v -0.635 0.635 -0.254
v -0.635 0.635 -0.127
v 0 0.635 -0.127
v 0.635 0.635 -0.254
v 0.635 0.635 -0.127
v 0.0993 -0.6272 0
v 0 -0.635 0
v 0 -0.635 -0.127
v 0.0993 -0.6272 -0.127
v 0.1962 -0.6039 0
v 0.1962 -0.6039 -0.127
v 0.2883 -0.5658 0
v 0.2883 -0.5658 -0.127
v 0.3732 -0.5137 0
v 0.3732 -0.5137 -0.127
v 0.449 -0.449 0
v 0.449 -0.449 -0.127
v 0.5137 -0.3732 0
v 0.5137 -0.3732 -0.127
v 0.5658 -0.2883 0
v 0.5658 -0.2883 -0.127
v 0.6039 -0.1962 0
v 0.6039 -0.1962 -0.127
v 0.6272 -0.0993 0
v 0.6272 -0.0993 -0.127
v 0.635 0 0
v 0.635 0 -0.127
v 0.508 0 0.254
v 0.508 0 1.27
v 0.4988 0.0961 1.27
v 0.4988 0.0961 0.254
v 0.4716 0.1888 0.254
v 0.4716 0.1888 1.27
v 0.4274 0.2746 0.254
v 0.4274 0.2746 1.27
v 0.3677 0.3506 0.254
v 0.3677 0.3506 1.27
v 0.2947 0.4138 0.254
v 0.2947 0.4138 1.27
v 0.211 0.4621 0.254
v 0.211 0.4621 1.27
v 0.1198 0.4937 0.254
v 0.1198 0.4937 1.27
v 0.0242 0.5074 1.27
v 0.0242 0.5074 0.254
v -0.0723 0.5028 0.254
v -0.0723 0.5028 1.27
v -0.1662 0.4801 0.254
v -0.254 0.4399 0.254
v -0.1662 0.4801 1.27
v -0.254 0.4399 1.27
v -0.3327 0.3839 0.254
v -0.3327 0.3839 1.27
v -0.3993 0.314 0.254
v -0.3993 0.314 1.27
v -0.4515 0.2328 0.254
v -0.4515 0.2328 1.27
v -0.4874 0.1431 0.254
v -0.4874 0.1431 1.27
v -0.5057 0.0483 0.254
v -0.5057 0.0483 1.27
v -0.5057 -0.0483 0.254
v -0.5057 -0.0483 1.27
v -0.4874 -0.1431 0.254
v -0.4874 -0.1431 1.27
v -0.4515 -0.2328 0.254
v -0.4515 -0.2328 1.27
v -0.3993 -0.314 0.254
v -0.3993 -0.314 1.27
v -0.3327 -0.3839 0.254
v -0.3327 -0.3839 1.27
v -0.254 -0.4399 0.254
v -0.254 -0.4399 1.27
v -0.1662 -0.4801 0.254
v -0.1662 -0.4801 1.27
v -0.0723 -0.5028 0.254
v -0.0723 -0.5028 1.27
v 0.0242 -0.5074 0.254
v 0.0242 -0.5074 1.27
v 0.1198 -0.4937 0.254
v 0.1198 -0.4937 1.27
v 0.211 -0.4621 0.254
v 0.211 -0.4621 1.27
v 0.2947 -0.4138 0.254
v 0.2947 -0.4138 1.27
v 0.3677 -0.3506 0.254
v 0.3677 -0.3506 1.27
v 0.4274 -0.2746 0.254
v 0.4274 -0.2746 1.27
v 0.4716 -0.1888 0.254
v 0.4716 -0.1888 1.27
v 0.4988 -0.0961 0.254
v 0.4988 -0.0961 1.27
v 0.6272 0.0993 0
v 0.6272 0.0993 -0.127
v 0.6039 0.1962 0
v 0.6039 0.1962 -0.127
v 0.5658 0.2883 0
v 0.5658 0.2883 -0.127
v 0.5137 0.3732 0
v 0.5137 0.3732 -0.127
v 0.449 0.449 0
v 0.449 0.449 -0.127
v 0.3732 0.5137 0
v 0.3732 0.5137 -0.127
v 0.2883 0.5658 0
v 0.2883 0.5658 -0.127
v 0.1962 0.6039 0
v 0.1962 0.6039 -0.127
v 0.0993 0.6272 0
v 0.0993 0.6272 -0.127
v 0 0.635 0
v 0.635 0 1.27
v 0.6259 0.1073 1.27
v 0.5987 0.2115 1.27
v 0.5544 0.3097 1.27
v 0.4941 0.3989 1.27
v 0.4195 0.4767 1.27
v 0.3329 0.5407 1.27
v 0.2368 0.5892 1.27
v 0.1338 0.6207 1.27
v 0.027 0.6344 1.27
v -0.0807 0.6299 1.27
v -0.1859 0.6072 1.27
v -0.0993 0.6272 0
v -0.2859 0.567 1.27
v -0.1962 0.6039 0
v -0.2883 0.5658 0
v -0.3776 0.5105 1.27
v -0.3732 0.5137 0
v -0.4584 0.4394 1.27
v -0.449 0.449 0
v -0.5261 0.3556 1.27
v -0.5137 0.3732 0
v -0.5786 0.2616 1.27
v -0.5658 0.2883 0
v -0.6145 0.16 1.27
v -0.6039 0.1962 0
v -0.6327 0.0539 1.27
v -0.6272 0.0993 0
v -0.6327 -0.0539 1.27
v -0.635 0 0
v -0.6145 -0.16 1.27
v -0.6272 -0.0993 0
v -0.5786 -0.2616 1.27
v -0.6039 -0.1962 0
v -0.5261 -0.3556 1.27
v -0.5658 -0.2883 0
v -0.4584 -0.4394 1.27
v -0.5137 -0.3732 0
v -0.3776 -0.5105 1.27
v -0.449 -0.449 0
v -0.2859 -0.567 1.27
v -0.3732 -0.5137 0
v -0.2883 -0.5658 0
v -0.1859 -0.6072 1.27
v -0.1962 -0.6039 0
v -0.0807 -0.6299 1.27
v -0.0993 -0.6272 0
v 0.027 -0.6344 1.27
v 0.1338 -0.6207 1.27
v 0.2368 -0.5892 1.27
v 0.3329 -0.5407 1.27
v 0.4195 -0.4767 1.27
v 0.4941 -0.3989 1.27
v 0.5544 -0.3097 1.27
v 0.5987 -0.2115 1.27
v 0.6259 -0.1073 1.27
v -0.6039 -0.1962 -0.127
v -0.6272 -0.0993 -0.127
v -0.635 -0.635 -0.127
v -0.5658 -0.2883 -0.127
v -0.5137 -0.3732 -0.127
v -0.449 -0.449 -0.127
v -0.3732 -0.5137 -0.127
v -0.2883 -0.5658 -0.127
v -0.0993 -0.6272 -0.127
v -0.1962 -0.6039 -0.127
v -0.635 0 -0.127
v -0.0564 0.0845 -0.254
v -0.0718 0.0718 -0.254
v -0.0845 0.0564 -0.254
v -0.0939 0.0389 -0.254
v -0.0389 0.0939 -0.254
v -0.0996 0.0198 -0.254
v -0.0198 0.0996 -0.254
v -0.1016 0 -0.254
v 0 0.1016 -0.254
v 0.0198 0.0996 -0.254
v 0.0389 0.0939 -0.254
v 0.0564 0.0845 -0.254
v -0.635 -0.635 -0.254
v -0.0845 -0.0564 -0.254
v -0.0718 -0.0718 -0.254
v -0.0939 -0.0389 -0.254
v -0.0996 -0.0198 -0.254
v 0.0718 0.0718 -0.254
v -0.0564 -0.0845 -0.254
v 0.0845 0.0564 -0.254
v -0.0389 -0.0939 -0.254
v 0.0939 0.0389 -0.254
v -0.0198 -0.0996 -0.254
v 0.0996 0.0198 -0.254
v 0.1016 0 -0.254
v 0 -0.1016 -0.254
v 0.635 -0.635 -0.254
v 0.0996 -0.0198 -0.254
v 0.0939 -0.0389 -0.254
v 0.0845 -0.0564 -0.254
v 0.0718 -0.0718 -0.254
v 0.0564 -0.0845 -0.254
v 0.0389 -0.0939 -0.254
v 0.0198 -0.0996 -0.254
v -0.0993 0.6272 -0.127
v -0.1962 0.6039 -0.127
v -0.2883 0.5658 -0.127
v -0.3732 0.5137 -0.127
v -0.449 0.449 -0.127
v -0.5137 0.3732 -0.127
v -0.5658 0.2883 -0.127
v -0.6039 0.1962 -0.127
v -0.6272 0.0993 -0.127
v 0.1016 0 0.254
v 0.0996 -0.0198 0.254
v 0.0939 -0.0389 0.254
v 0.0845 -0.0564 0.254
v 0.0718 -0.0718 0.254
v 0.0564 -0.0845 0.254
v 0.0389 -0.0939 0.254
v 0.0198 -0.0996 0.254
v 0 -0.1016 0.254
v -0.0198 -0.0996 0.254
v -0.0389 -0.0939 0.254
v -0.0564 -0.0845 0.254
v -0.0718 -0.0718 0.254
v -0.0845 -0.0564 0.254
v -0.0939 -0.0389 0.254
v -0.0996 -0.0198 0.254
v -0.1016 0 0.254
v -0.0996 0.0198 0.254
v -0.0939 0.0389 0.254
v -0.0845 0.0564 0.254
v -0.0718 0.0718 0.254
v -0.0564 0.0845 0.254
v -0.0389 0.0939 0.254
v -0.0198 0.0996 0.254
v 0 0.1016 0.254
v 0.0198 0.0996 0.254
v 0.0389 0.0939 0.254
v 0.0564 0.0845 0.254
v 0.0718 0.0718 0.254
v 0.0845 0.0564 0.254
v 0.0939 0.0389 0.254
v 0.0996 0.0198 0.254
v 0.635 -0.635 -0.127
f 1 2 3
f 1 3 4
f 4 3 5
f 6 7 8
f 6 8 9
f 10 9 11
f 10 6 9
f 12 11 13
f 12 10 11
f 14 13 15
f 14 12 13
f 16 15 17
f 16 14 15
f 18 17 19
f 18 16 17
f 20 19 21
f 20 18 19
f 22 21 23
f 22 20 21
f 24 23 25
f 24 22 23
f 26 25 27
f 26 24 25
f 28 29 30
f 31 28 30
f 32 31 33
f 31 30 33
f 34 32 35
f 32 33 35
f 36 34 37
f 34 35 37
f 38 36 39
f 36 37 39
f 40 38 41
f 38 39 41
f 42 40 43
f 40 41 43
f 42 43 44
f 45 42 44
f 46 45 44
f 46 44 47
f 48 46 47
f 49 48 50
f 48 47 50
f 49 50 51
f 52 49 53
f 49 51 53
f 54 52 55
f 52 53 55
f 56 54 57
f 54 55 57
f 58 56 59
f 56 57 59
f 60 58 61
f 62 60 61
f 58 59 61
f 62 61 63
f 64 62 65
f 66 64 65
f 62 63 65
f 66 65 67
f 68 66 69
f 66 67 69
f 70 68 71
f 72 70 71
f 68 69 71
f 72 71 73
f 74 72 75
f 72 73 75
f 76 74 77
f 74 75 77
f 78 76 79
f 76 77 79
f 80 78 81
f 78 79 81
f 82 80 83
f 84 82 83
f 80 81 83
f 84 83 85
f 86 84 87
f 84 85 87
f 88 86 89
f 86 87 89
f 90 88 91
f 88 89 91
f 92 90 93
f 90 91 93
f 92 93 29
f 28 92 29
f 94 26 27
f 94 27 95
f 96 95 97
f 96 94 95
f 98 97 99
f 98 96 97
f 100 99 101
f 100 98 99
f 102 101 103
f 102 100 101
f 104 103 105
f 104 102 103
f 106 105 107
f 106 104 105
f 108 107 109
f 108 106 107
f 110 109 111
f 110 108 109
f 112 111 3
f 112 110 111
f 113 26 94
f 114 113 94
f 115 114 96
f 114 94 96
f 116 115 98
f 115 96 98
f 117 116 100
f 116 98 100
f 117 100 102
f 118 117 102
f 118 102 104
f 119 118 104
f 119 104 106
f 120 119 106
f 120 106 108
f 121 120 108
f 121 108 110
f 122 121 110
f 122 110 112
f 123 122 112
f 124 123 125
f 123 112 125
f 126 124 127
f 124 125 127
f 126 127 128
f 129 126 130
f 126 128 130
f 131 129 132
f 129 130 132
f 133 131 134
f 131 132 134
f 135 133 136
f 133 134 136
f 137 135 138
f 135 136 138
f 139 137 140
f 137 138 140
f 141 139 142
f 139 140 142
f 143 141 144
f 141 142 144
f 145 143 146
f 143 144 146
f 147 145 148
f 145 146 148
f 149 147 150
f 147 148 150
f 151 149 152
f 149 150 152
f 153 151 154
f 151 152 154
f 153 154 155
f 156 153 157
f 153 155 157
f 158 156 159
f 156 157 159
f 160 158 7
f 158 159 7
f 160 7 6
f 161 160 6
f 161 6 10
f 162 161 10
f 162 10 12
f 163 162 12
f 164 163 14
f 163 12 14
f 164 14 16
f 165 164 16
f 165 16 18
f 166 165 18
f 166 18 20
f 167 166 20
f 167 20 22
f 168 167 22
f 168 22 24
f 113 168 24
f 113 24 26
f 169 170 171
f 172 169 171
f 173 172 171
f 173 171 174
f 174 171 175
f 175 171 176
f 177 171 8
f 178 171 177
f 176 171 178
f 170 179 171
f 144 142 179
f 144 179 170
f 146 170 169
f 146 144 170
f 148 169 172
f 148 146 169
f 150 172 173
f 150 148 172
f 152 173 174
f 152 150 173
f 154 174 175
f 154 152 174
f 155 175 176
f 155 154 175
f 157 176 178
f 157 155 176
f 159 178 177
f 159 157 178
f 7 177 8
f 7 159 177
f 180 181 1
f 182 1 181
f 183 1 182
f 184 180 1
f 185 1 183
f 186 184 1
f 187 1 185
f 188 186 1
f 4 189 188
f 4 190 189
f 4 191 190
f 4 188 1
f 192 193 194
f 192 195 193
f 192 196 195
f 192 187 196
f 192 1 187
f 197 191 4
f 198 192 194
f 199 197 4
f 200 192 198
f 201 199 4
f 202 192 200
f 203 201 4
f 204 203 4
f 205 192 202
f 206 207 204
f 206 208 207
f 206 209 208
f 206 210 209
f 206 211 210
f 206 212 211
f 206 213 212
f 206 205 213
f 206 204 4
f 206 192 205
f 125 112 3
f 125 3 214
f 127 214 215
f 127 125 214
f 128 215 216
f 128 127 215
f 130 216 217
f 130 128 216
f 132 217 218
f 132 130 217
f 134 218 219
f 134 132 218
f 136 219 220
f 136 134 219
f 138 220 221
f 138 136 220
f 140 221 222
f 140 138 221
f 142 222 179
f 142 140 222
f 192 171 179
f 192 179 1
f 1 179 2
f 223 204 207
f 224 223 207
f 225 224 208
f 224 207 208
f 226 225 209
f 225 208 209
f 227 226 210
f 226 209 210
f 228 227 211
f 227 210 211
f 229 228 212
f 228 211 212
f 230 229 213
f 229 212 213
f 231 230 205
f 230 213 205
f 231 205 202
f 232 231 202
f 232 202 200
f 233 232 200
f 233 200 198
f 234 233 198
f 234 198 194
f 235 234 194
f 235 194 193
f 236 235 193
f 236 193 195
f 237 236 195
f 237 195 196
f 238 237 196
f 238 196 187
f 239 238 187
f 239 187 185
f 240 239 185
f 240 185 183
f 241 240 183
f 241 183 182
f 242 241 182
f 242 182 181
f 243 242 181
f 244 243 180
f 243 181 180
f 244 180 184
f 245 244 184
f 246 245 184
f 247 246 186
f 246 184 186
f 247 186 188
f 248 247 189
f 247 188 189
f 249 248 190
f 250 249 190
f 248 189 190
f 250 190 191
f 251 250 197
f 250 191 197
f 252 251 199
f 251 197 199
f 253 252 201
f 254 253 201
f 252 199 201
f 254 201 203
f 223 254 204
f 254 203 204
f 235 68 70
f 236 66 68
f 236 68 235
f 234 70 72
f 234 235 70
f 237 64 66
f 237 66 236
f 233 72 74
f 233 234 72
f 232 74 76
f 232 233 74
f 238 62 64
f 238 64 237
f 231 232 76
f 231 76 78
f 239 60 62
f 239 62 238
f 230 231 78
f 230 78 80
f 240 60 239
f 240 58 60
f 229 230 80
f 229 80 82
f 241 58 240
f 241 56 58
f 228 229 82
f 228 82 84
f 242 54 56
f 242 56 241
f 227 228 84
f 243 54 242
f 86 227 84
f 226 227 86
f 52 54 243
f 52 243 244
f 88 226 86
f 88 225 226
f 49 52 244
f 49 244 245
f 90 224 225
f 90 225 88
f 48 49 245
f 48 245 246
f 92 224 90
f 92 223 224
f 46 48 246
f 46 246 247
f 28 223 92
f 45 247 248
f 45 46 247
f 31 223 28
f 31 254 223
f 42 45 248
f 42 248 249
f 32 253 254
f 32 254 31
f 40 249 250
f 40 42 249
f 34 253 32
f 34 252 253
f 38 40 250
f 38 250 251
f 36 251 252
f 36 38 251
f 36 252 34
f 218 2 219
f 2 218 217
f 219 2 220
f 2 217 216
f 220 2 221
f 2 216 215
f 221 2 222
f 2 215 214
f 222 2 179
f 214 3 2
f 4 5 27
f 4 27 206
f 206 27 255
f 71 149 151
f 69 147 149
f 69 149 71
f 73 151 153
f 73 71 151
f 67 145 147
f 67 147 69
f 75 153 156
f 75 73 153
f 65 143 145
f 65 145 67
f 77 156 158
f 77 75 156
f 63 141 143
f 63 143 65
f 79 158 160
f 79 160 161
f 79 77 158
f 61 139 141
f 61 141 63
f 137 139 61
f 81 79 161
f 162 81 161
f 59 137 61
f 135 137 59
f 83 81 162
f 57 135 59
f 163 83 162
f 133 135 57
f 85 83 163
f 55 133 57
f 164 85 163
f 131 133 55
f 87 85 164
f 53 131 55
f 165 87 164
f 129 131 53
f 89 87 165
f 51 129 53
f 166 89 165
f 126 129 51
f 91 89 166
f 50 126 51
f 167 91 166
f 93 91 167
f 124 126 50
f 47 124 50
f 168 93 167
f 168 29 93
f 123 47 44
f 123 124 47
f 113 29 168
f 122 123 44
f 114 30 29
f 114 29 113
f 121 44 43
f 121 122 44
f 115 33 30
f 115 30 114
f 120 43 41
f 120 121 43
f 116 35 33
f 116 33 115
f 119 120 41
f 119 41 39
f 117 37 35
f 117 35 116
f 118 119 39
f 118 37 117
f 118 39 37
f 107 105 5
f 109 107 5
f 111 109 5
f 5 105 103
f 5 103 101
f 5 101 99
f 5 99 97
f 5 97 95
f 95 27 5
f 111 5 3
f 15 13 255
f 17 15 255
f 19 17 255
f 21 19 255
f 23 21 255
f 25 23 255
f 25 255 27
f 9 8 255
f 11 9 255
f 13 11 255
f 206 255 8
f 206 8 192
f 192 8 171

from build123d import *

# Parameters (mm, degrees)
F0_R     = 0.635
F1_DEPTH = 1.27
F2_R     = 0.508
F3_DEPTH = 1.016
F5_DEPTH = 0.254
F6_DEPTH = 0.127
F7_R     = 0.1016
F8_DEPTH = 25.4


with BuildPart() as f1:
    # F0 (on Top) → F1 (new body)
    with BuildSketch(Plane.XY):
        Circle(F0_R)
    extrude(amount=F1_DEPTH)

    # F2 (on face) → F3 (cut)
    with BuildSketch(Plane.XY.offset(1.27)):
        Circle(F2_R)
    extrude(amount=-F3_DEPTH, mode=Mode.SUBTRACT)

    # F4 (on face) → F5 (join)
    with BuildSketch(Plane(origin=(0, 0, 0), x_dir=(1, 0, 0), z_dir=(0, 0, -1))):
        with BuildLine():
            Line((0.635, 0), (0.635, 0.635))
            Line((0.635, 0.635), (0, 0.635))
            ThreePointArc((0, 0.635), (0.4490128061, 0.4490128061), (0.635, 0))
        make_face()
        with BuildLine():
            ThreePointArc((-0.635, 0), (-0.4490128061, 0.4490128061), (0, 0.635))
            Line((0, 0.635), (-0.635, 0.635))
            Line((-0.635, 0.635), (-0.635, 0))
        make_face()
        with BuildLine():
            ThreePointArc((0.635, 0), (0.4490128061, 0.4490128061), (0, 0.635))
            ThreePointArc((0, 0.635), (-0.4490128061, 0.4490128061), (-0.635, 0))
            ThreePointArc((-0.635, 0), (-0.4490128061, -0.4490128061), (0, -0.635))
            ThreePointArc((0, -0.635), (0.4490128061, -0.4490128061), (0.635, 0))
        make_face()
        with BuildLine():
            Line((0.635, -0.635), (0.635, 0))
            ThreePointArc((0.635, 0), (0.4490128061, -0.4490128061), (0, -0.635))
            Line((0, -0.635), (0.635, -0.635))
        make_face()
        with BuildLine():
            ThreePointArc((0, -0.635), (-0.4490128061, -0.4490128061), (-0.635, 0))
            Line((-0.635, 0), (-0.635, -0.635))
            Line((-0.635, -0.635), (0, -0.635))
        make_face()
    extrude(amount=F5_DEPTH)

    # F6 (cut): faces of the model
    f6_faces = [f1.faces().sort_by_distance(p)[0] for p in [
        (-0.4931613588, 0.4931613588, 0),
        (-0.4931613588, -0.4931613588, 0),
        (0.4931613588, -0.4931613588, 0),
        (0.4931613588, 0.4931613588, 0),
    ]]
    extrude(f6_faces, amount=-F6_DEPTH, mode=Mode.SUBTRACT)

    # F7 (on face) → F8 (cut)
    with BuildSketch(Plane(origin=(0, 0, -0.254), x_dir=(1, 0, 0), z_dir=(0, 0, -1))):
        Circle(F7_R)
    extrude(amount=-F8_DEPTH, mode=Mode.SUBTRACT)


solid = f1.part
